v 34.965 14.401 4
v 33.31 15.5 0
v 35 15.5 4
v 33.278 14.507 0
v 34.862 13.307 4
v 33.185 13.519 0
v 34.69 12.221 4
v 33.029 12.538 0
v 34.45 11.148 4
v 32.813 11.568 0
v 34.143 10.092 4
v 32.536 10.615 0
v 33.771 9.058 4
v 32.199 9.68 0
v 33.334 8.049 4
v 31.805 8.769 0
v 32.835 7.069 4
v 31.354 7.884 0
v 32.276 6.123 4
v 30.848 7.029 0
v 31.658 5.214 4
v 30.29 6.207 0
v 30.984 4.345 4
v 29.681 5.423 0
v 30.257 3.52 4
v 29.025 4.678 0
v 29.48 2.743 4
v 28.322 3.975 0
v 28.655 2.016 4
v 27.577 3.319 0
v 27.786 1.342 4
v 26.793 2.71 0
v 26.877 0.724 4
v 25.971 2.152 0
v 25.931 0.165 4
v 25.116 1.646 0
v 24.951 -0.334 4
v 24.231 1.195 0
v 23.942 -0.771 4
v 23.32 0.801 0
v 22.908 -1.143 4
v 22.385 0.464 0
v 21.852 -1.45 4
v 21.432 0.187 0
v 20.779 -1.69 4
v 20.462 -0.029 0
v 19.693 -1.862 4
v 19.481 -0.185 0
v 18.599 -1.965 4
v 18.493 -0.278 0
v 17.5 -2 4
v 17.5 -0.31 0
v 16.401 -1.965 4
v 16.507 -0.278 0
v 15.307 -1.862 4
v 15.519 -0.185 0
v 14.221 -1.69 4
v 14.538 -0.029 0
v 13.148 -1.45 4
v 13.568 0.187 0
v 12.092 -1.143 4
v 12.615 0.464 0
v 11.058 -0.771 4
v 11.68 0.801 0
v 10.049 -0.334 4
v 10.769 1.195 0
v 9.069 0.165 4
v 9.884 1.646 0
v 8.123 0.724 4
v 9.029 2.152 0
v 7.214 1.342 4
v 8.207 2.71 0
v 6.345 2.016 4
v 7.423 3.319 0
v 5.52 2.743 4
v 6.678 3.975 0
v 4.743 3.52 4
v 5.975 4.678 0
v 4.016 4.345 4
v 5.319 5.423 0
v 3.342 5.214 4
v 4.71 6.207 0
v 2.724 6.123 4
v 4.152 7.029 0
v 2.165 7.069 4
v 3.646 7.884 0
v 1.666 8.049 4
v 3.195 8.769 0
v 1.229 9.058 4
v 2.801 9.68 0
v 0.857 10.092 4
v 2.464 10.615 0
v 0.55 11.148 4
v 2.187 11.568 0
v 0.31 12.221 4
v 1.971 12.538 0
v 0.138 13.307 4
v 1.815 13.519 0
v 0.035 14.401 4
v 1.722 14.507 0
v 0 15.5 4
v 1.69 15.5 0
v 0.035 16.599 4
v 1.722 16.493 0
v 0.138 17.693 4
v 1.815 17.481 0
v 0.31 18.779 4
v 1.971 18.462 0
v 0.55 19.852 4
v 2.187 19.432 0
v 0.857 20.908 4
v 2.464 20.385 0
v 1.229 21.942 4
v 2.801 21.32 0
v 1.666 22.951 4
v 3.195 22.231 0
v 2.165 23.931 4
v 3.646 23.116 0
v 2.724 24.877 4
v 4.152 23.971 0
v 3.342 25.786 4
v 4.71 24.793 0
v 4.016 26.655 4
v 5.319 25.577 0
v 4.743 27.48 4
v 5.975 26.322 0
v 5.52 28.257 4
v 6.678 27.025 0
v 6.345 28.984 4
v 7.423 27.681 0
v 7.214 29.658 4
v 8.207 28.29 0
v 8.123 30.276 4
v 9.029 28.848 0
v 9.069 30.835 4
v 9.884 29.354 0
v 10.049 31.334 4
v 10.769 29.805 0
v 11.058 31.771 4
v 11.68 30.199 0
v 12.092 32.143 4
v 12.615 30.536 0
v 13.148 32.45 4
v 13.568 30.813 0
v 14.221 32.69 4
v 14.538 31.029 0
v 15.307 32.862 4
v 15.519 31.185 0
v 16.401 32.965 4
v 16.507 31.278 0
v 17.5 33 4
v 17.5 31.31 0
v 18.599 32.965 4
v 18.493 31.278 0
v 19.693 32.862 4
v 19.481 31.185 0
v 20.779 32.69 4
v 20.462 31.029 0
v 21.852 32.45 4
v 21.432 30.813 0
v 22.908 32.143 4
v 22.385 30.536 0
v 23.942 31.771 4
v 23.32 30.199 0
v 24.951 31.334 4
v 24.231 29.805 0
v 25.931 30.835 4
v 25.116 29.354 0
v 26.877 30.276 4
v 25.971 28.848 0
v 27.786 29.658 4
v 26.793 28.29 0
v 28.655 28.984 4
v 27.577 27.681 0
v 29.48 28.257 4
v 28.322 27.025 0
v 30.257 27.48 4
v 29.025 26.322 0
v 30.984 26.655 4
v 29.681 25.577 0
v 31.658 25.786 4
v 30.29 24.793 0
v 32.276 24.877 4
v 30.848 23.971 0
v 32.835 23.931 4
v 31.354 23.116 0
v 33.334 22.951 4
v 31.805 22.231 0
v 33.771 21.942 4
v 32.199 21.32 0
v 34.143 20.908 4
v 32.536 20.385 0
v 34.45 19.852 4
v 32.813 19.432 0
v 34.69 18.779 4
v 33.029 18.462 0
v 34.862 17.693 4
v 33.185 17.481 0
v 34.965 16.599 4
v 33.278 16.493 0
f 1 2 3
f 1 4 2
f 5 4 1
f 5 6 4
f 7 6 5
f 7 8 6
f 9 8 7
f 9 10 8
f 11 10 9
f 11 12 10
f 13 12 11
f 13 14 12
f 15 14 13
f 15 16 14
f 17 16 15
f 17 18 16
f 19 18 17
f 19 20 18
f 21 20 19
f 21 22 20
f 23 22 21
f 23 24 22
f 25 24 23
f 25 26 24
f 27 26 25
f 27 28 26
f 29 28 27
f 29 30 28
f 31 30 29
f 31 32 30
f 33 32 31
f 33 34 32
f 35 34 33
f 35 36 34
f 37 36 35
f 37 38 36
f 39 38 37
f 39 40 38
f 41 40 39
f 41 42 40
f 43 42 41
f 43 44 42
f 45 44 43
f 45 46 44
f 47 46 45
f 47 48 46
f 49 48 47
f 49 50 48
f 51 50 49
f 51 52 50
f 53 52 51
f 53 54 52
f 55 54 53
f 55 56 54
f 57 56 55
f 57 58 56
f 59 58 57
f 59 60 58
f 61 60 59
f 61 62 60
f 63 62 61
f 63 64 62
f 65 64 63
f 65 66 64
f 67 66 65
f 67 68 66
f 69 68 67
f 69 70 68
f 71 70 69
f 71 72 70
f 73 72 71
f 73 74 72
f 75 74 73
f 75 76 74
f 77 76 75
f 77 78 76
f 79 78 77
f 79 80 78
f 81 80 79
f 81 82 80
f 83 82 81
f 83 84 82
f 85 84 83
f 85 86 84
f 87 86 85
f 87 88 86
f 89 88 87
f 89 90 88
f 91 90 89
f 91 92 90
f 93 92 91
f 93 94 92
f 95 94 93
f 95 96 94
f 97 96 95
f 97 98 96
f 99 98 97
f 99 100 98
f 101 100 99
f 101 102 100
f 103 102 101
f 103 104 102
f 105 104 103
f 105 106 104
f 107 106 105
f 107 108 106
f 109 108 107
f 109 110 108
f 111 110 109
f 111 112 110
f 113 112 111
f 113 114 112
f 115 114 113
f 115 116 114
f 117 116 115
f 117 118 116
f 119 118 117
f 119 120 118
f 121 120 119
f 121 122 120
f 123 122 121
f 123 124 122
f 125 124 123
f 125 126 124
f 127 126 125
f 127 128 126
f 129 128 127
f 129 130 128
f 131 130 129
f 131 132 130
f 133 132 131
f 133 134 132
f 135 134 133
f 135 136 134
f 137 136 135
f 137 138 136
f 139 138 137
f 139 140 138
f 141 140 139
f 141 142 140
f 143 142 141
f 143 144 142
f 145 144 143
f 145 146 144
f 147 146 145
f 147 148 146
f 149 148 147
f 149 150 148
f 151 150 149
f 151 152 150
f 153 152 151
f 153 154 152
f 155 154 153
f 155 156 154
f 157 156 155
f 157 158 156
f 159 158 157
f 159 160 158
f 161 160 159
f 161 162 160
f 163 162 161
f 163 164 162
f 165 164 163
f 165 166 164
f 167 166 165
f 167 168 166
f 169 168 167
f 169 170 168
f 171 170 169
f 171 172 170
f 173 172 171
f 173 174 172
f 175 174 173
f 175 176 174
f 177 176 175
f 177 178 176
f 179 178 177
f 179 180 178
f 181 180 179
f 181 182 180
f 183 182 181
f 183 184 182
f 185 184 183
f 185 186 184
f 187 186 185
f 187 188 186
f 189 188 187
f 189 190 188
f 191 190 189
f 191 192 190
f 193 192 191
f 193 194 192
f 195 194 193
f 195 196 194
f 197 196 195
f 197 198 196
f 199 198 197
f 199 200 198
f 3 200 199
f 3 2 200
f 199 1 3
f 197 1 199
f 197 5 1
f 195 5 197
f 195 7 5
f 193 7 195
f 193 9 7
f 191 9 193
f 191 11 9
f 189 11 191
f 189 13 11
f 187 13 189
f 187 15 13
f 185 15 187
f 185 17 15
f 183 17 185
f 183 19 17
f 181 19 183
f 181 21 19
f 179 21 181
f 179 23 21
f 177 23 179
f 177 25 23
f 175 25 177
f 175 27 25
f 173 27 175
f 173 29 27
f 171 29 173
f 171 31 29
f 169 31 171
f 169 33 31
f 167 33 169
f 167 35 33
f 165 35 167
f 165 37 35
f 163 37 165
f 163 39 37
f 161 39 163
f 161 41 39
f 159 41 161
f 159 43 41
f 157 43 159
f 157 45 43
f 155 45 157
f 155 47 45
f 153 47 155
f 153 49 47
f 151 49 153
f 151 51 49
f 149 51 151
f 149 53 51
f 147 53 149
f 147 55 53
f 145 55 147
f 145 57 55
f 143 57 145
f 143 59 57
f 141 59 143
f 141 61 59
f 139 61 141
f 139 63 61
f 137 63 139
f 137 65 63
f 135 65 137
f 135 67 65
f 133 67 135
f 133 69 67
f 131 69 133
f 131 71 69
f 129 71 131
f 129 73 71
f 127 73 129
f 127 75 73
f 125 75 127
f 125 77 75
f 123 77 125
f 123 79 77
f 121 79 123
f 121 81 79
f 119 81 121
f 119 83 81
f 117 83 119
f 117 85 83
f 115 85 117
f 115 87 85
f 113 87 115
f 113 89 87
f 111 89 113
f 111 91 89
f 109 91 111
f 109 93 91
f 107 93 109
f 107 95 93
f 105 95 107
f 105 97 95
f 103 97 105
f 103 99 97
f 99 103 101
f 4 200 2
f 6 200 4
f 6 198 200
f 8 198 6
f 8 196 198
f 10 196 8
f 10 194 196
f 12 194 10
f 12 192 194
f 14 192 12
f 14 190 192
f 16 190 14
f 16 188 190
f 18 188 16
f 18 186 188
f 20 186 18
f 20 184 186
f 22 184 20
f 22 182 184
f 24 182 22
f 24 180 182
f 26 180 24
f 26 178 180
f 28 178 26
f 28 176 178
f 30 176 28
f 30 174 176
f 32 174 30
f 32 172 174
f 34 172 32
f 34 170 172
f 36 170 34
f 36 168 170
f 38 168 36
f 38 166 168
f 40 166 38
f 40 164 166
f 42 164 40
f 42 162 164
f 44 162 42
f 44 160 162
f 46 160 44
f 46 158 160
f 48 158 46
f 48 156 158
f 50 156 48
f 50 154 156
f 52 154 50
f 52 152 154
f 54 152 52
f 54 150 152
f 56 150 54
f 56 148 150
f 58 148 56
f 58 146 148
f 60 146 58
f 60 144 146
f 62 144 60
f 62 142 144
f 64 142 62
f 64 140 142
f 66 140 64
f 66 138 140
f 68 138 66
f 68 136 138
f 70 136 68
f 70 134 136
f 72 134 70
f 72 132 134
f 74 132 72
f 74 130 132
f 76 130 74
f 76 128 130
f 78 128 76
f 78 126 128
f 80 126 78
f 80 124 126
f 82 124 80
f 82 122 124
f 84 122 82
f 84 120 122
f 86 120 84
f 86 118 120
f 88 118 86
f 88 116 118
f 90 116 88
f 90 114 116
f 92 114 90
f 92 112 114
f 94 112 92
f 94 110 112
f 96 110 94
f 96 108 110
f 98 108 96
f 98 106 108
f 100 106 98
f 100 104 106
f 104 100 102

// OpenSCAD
// Customizable Miniature Base
// Created by Rob Ross, February 2014
//
// Derived from the "Customizable Stone Wall"
// Created by Ari M. Diacou, January 2014
// Shared under Creative Commons License: Attribution-ShareAlike 3.0 Unported (CC BY-SA 3.0) 
// see http://creativecommons.org/licenses/by-sa/3.0/
//
// Notes:
// - "have_topper" option is not working.
// - good: 40mm, num_x = 4, stone_offset = 2, master_seed=41, z_compression=1.1

// preview[view:south east, tilt:bottom]

/* [Base] */
// Width of base at the bottom (mm)
base_width = 35; // [25:60]
// Total height of base (mm)
base_height = 4; // [2:5]
// Angle of sidewall (0 degrees is vertical)
base_angle = 25;


// Whether or not to include the stone topper [0:1]
have_topper = 0; // [0:No,1:Yes]

/* [Stones] */
// Relative length of a stone
U=3;
// Relative width of a stone
W=2;
// Approx. number of stones along floor at widest point
num_x=4;
// Height of stones above base body
topper_height = 0.75;
// A way to save the arrangement of stones

/* [Tweaks] */
master_seed=41;
// Higher angles make more wedge-shaped stones, lower angles produce blocks. Reccomend 5-30 (zero crashes).
maximum_rotation_angle=5;
// Higher rotation angles might need more compression
z_compression=1.1;
// Offset shifts the stones in the Y direction, can help in placement
stone_offset=2;
// Width of lip between top of base and start of stones (mm)
lip_width = 0.3;
// In mm, reduces dimensions of base bottom to help it fit inside base exterior.
slop = 0.2;

/* [Hidden] */

// This is Ari's old "thickness" parameter, which doesn't need to be configurable.
V=1;
//The wall height in number of stones can be derived from other parameters
num_z= ceil(num_x / W * U);

// Split determines whether to bother to split the base into parts or not
split = 0;


/**** Main Routines ****/

if (split) {
	translate([-1 * base_width / 2, base_width / 2 - 2, 0]) base_bottom();
}

translate([0,base_width - 2, base_height + have_topper * topper_height]) rotate ([180,0,0]) 
{
if (have_topper) {
	union() {
		base_exterior();
		topper();
	}
}
else {
	base_exterior();
}
}

// base_exterior() - angled sides and top of base
module base_exterior()
{
	translate([base_width / 2, base_width / 2, 0])
	difference() {
		cylinder($fn=100, r1 = base_width / 2, 
			r2 = base_width / 2 -  base_height *sin(base_angle),
			h = base_height - have_topper * topper_height);
		if (split) {
			cylinder(r=base_width/2 - base_height * sin(base_angle) - 1,
				h = base_height - 1);	
		}
	}
}

// base_bottom() - flat bottom of base with space for magnets, etc.
module base_bottom()
{
	difference() {
		cylinder(r=base_width/2 - base_height * sin(base_angle) - 1 - slop/2,
			h = base_height - 1 - slop);
		translate([0,0,1]) cylinder(r=base_width/2 - base_height * sin(base_angle) - 2 - slop/2,
			h = base_height - 1 - slop);
	}
}

// topper() -- generates the flagstone topper using the raw_flagstones() module below.
module topper()
{
//	intersection() {
		translate([0,stone_offset,2]) rotate([-90,0,0]) raw_flagstones(base_width + 5);
//		translate([base_width / 2, base_width / 2, base_height - have_topper * topper_height]) 
%			cylinder(r=base_width/2 - base_height * sin(base_angle) - lip_width,
				h = topper_height);
//	}
}

// raw_flagstones() -- generates the floor of flagstones; used to be wall() in Ari's
//                     original version of this code.
module raw_flagstones(width) {
	dimensions=[U,V,W];
	half_dimensions=[U/2,V,W];

	scalefactor = width / (W * num_z);
	scale([scalefactor, scalefactor, scalefactor]) 
	union(){
			for(z=[0:num_z-1]){
				for(x=[0:num_x-1 + 1]){
						translate([U*(x+0.5-0.25*(1+pow(-1,z))), 0,z*W*z_compression]) 
							color("SlateGray")
								rock(dimensions,maximum_rotation_angle,num_x*z+x);
					}
				}
		}
}

// rock() -- generates a rock at origin. Slight adjustment (bug fix?) from Ari's version.
module rock(unit_dimension, max_rotation, seed)
{
	rotation_vector=rands(-max_rotation,max_rotation,3*3,seed*1000*master_seed);
	//echo( "rotation_vector: ",rotation_vector);
	intersection()
	{
		rotate([rotation_vector[1],rotation_vector[1+1],rotation_vector[1+2]]) 
			cube(unit_dimension,center=true);
		rotate([rotation_vector[4],rotation_vector[4+1],rotation_vector[4+2]]) 
			cube(unit_dimension,center=true);
		rotate([rotation_vector[7],rotation_vector[7+1],rotation_vector[7+2]]) 
			cube(unit_dimension,center=true);
	}
}
